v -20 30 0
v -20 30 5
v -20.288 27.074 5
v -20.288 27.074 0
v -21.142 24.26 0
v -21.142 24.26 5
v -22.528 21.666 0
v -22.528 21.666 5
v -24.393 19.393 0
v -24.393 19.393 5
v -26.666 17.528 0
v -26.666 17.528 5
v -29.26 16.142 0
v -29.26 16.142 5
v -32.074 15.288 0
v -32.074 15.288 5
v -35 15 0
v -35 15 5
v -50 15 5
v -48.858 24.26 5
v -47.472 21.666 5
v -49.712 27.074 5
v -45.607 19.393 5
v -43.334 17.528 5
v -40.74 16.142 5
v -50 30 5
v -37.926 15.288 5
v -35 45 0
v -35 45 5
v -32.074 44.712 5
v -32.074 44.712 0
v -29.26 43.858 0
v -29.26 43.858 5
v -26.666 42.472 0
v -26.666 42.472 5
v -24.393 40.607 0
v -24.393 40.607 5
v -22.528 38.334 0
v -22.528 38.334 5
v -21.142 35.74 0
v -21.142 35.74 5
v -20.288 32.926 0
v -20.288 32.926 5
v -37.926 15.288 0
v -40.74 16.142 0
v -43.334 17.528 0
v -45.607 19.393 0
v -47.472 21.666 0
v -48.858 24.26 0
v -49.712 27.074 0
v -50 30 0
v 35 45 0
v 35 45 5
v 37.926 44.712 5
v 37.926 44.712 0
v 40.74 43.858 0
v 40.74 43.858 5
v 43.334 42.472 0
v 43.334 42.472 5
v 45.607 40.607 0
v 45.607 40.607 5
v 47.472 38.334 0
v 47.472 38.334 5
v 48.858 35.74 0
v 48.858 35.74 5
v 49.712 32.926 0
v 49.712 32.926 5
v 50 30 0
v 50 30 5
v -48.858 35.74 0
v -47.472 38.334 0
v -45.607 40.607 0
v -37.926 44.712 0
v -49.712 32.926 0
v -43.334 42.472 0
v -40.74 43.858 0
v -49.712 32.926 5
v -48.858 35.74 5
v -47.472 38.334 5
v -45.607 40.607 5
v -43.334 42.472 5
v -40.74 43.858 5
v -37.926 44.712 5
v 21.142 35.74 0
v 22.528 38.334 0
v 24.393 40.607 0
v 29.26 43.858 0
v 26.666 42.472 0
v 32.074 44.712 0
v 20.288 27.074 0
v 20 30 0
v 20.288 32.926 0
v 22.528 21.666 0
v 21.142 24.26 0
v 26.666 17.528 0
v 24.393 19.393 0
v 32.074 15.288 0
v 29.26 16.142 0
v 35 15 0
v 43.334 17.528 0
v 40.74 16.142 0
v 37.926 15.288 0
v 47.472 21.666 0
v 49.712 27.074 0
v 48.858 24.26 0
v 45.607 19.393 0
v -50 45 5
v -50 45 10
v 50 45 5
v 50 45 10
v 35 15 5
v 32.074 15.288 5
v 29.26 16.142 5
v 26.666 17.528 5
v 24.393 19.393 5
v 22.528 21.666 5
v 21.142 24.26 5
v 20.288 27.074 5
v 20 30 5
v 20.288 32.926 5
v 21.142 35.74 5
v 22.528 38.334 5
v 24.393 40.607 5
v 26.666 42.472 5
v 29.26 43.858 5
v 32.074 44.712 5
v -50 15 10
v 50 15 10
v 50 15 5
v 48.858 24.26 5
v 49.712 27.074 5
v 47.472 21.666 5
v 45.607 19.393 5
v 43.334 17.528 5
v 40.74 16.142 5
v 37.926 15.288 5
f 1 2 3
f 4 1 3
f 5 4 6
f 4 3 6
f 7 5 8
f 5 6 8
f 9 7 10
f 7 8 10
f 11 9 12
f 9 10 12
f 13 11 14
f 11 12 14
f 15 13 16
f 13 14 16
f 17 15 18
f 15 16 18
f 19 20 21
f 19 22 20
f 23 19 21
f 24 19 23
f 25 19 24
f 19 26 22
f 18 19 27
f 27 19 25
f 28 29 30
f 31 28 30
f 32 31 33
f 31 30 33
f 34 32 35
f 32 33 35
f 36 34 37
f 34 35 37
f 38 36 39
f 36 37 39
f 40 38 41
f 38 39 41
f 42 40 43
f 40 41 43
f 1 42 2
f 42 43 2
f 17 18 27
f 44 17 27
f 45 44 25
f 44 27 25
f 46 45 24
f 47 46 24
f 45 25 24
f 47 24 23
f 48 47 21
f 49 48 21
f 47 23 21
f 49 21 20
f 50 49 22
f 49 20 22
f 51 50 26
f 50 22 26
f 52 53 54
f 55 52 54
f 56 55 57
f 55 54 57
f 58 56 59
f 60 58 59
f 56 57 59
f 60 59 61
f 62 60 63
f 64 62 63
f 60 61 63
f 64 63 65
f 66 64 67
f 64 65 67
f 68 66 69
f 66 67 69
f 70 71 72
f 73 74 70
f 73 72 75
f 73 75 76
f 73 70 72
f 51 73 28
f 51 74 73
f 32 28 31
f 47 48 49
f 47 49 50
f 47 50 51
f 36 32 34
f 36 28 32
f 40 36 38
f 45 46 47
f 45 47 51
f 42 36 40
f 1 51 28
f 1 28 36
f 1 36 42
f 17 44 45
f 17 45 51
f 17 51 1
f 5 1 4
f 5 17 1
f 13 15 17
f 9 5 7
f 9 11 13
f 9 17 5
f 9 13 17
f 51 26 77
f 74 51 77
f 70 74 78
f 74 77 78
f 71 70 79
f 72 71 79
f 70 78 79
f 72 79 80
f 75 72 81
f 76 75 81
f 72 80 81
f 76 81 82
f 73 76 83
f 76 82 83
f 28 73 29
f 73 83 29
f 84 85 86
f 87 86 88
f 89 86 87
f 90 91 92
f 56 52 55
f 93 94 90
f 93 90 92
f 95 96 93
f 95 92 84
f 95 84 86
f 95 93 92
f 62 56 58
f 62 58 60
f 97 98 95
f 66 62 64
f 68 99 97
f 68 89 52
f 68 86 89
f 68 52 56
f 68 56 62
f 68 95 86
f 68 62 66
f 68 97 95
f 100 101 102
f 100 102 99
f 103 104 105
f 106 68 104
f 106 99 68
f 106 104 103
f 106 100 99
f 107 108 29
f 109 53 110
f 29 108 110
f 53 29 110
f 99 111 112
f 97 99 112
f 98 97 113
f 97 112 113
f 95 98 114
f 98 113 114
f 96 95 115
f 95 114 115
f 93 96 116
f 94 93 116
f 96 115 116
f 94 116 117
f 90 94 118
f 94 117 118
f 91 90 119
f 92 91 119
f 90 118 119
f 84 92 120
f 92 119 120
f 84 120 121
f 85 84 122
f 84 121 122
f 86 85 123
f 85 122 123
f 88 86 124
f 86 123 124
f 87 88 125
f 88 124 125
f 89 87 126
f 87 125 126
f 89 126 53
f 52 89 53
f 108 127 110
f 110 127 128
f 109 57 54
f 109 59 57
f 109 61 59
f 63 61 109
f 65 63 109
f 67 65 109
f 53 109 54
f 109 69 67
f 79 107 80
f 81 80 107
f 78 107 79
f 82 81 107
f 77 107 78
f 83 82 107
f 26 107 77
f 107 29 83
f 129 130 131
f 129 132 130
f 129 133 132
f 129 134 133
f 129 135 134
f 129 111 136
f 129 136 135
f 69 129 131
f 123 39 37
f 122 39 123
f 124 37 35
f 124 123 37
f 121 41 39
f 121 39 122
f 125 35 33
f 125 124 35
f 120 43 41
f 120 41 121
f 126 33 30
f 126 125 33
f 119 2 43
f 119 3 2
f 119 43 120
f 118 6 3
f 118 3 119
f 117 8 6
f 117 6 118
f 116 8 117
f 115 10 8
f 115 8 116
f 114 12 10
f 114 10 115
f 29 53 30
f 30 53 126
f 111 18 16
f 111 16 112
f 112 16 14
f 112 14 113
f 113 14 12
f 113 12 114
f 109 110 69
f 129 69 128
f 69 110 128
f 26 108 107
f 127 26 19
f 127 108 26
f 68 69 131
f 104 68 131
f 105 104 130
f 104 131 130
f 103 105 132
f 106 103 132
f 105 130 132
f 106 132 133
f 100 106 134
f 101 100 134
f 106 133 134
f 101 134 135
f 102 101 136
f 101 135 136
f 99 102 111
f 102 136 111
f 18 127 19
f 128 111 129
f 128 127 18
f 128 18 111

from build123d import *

# Parameters (mm, degrees)
F0_W     = 100
F0_H     = 30
F1_DEPTH = 5
F3_DEPTH = 5
F4_ANGLE = 180


with BuildPart() as f1:
    # F0 (on Top) → F1 (new body)
    with BuildSketch(Plane.XY):
        Rectangle(F0_W, F0_H)
    extrude(amount=F1_DEPTH)

    # F2 (on face) → F3 (join)
    with BuildSketch(Plane.XY.offset(5)):
        with BuildLine():
            ThreePointArc((35, -15), (45.606602, -10.606602), (50, 0))
            ThreePointArc((50, 0), (45.606602, 10.606602), (35, 15))
            ThreePointArc((35, 15), (20, 0), (35, -15))
        make_face()
        with BuildLine():
            ThreePointArc((-20, 0), (-24.393398, 10.606602), (-35, 15))
            ThreePointArc((-35, 15), (-45.606602, 10.606602), (-50, 0))
            ThreePointArc((-50, 0), (-45.606602, -10.606602), (-35, -15))
            ThreePointArc((-35, -15), (-24.393398, -10.606602), (-20, 0))
        make_face()
    extrude(amount=F3_DEPTH)


with BuildPart() as f1_1:
    # F4: moved
    add(f1.part.rotate(Axis((0, 15, 5), (-1, 0, 0)), F4_ANGLE))


solid = f1_1.part
